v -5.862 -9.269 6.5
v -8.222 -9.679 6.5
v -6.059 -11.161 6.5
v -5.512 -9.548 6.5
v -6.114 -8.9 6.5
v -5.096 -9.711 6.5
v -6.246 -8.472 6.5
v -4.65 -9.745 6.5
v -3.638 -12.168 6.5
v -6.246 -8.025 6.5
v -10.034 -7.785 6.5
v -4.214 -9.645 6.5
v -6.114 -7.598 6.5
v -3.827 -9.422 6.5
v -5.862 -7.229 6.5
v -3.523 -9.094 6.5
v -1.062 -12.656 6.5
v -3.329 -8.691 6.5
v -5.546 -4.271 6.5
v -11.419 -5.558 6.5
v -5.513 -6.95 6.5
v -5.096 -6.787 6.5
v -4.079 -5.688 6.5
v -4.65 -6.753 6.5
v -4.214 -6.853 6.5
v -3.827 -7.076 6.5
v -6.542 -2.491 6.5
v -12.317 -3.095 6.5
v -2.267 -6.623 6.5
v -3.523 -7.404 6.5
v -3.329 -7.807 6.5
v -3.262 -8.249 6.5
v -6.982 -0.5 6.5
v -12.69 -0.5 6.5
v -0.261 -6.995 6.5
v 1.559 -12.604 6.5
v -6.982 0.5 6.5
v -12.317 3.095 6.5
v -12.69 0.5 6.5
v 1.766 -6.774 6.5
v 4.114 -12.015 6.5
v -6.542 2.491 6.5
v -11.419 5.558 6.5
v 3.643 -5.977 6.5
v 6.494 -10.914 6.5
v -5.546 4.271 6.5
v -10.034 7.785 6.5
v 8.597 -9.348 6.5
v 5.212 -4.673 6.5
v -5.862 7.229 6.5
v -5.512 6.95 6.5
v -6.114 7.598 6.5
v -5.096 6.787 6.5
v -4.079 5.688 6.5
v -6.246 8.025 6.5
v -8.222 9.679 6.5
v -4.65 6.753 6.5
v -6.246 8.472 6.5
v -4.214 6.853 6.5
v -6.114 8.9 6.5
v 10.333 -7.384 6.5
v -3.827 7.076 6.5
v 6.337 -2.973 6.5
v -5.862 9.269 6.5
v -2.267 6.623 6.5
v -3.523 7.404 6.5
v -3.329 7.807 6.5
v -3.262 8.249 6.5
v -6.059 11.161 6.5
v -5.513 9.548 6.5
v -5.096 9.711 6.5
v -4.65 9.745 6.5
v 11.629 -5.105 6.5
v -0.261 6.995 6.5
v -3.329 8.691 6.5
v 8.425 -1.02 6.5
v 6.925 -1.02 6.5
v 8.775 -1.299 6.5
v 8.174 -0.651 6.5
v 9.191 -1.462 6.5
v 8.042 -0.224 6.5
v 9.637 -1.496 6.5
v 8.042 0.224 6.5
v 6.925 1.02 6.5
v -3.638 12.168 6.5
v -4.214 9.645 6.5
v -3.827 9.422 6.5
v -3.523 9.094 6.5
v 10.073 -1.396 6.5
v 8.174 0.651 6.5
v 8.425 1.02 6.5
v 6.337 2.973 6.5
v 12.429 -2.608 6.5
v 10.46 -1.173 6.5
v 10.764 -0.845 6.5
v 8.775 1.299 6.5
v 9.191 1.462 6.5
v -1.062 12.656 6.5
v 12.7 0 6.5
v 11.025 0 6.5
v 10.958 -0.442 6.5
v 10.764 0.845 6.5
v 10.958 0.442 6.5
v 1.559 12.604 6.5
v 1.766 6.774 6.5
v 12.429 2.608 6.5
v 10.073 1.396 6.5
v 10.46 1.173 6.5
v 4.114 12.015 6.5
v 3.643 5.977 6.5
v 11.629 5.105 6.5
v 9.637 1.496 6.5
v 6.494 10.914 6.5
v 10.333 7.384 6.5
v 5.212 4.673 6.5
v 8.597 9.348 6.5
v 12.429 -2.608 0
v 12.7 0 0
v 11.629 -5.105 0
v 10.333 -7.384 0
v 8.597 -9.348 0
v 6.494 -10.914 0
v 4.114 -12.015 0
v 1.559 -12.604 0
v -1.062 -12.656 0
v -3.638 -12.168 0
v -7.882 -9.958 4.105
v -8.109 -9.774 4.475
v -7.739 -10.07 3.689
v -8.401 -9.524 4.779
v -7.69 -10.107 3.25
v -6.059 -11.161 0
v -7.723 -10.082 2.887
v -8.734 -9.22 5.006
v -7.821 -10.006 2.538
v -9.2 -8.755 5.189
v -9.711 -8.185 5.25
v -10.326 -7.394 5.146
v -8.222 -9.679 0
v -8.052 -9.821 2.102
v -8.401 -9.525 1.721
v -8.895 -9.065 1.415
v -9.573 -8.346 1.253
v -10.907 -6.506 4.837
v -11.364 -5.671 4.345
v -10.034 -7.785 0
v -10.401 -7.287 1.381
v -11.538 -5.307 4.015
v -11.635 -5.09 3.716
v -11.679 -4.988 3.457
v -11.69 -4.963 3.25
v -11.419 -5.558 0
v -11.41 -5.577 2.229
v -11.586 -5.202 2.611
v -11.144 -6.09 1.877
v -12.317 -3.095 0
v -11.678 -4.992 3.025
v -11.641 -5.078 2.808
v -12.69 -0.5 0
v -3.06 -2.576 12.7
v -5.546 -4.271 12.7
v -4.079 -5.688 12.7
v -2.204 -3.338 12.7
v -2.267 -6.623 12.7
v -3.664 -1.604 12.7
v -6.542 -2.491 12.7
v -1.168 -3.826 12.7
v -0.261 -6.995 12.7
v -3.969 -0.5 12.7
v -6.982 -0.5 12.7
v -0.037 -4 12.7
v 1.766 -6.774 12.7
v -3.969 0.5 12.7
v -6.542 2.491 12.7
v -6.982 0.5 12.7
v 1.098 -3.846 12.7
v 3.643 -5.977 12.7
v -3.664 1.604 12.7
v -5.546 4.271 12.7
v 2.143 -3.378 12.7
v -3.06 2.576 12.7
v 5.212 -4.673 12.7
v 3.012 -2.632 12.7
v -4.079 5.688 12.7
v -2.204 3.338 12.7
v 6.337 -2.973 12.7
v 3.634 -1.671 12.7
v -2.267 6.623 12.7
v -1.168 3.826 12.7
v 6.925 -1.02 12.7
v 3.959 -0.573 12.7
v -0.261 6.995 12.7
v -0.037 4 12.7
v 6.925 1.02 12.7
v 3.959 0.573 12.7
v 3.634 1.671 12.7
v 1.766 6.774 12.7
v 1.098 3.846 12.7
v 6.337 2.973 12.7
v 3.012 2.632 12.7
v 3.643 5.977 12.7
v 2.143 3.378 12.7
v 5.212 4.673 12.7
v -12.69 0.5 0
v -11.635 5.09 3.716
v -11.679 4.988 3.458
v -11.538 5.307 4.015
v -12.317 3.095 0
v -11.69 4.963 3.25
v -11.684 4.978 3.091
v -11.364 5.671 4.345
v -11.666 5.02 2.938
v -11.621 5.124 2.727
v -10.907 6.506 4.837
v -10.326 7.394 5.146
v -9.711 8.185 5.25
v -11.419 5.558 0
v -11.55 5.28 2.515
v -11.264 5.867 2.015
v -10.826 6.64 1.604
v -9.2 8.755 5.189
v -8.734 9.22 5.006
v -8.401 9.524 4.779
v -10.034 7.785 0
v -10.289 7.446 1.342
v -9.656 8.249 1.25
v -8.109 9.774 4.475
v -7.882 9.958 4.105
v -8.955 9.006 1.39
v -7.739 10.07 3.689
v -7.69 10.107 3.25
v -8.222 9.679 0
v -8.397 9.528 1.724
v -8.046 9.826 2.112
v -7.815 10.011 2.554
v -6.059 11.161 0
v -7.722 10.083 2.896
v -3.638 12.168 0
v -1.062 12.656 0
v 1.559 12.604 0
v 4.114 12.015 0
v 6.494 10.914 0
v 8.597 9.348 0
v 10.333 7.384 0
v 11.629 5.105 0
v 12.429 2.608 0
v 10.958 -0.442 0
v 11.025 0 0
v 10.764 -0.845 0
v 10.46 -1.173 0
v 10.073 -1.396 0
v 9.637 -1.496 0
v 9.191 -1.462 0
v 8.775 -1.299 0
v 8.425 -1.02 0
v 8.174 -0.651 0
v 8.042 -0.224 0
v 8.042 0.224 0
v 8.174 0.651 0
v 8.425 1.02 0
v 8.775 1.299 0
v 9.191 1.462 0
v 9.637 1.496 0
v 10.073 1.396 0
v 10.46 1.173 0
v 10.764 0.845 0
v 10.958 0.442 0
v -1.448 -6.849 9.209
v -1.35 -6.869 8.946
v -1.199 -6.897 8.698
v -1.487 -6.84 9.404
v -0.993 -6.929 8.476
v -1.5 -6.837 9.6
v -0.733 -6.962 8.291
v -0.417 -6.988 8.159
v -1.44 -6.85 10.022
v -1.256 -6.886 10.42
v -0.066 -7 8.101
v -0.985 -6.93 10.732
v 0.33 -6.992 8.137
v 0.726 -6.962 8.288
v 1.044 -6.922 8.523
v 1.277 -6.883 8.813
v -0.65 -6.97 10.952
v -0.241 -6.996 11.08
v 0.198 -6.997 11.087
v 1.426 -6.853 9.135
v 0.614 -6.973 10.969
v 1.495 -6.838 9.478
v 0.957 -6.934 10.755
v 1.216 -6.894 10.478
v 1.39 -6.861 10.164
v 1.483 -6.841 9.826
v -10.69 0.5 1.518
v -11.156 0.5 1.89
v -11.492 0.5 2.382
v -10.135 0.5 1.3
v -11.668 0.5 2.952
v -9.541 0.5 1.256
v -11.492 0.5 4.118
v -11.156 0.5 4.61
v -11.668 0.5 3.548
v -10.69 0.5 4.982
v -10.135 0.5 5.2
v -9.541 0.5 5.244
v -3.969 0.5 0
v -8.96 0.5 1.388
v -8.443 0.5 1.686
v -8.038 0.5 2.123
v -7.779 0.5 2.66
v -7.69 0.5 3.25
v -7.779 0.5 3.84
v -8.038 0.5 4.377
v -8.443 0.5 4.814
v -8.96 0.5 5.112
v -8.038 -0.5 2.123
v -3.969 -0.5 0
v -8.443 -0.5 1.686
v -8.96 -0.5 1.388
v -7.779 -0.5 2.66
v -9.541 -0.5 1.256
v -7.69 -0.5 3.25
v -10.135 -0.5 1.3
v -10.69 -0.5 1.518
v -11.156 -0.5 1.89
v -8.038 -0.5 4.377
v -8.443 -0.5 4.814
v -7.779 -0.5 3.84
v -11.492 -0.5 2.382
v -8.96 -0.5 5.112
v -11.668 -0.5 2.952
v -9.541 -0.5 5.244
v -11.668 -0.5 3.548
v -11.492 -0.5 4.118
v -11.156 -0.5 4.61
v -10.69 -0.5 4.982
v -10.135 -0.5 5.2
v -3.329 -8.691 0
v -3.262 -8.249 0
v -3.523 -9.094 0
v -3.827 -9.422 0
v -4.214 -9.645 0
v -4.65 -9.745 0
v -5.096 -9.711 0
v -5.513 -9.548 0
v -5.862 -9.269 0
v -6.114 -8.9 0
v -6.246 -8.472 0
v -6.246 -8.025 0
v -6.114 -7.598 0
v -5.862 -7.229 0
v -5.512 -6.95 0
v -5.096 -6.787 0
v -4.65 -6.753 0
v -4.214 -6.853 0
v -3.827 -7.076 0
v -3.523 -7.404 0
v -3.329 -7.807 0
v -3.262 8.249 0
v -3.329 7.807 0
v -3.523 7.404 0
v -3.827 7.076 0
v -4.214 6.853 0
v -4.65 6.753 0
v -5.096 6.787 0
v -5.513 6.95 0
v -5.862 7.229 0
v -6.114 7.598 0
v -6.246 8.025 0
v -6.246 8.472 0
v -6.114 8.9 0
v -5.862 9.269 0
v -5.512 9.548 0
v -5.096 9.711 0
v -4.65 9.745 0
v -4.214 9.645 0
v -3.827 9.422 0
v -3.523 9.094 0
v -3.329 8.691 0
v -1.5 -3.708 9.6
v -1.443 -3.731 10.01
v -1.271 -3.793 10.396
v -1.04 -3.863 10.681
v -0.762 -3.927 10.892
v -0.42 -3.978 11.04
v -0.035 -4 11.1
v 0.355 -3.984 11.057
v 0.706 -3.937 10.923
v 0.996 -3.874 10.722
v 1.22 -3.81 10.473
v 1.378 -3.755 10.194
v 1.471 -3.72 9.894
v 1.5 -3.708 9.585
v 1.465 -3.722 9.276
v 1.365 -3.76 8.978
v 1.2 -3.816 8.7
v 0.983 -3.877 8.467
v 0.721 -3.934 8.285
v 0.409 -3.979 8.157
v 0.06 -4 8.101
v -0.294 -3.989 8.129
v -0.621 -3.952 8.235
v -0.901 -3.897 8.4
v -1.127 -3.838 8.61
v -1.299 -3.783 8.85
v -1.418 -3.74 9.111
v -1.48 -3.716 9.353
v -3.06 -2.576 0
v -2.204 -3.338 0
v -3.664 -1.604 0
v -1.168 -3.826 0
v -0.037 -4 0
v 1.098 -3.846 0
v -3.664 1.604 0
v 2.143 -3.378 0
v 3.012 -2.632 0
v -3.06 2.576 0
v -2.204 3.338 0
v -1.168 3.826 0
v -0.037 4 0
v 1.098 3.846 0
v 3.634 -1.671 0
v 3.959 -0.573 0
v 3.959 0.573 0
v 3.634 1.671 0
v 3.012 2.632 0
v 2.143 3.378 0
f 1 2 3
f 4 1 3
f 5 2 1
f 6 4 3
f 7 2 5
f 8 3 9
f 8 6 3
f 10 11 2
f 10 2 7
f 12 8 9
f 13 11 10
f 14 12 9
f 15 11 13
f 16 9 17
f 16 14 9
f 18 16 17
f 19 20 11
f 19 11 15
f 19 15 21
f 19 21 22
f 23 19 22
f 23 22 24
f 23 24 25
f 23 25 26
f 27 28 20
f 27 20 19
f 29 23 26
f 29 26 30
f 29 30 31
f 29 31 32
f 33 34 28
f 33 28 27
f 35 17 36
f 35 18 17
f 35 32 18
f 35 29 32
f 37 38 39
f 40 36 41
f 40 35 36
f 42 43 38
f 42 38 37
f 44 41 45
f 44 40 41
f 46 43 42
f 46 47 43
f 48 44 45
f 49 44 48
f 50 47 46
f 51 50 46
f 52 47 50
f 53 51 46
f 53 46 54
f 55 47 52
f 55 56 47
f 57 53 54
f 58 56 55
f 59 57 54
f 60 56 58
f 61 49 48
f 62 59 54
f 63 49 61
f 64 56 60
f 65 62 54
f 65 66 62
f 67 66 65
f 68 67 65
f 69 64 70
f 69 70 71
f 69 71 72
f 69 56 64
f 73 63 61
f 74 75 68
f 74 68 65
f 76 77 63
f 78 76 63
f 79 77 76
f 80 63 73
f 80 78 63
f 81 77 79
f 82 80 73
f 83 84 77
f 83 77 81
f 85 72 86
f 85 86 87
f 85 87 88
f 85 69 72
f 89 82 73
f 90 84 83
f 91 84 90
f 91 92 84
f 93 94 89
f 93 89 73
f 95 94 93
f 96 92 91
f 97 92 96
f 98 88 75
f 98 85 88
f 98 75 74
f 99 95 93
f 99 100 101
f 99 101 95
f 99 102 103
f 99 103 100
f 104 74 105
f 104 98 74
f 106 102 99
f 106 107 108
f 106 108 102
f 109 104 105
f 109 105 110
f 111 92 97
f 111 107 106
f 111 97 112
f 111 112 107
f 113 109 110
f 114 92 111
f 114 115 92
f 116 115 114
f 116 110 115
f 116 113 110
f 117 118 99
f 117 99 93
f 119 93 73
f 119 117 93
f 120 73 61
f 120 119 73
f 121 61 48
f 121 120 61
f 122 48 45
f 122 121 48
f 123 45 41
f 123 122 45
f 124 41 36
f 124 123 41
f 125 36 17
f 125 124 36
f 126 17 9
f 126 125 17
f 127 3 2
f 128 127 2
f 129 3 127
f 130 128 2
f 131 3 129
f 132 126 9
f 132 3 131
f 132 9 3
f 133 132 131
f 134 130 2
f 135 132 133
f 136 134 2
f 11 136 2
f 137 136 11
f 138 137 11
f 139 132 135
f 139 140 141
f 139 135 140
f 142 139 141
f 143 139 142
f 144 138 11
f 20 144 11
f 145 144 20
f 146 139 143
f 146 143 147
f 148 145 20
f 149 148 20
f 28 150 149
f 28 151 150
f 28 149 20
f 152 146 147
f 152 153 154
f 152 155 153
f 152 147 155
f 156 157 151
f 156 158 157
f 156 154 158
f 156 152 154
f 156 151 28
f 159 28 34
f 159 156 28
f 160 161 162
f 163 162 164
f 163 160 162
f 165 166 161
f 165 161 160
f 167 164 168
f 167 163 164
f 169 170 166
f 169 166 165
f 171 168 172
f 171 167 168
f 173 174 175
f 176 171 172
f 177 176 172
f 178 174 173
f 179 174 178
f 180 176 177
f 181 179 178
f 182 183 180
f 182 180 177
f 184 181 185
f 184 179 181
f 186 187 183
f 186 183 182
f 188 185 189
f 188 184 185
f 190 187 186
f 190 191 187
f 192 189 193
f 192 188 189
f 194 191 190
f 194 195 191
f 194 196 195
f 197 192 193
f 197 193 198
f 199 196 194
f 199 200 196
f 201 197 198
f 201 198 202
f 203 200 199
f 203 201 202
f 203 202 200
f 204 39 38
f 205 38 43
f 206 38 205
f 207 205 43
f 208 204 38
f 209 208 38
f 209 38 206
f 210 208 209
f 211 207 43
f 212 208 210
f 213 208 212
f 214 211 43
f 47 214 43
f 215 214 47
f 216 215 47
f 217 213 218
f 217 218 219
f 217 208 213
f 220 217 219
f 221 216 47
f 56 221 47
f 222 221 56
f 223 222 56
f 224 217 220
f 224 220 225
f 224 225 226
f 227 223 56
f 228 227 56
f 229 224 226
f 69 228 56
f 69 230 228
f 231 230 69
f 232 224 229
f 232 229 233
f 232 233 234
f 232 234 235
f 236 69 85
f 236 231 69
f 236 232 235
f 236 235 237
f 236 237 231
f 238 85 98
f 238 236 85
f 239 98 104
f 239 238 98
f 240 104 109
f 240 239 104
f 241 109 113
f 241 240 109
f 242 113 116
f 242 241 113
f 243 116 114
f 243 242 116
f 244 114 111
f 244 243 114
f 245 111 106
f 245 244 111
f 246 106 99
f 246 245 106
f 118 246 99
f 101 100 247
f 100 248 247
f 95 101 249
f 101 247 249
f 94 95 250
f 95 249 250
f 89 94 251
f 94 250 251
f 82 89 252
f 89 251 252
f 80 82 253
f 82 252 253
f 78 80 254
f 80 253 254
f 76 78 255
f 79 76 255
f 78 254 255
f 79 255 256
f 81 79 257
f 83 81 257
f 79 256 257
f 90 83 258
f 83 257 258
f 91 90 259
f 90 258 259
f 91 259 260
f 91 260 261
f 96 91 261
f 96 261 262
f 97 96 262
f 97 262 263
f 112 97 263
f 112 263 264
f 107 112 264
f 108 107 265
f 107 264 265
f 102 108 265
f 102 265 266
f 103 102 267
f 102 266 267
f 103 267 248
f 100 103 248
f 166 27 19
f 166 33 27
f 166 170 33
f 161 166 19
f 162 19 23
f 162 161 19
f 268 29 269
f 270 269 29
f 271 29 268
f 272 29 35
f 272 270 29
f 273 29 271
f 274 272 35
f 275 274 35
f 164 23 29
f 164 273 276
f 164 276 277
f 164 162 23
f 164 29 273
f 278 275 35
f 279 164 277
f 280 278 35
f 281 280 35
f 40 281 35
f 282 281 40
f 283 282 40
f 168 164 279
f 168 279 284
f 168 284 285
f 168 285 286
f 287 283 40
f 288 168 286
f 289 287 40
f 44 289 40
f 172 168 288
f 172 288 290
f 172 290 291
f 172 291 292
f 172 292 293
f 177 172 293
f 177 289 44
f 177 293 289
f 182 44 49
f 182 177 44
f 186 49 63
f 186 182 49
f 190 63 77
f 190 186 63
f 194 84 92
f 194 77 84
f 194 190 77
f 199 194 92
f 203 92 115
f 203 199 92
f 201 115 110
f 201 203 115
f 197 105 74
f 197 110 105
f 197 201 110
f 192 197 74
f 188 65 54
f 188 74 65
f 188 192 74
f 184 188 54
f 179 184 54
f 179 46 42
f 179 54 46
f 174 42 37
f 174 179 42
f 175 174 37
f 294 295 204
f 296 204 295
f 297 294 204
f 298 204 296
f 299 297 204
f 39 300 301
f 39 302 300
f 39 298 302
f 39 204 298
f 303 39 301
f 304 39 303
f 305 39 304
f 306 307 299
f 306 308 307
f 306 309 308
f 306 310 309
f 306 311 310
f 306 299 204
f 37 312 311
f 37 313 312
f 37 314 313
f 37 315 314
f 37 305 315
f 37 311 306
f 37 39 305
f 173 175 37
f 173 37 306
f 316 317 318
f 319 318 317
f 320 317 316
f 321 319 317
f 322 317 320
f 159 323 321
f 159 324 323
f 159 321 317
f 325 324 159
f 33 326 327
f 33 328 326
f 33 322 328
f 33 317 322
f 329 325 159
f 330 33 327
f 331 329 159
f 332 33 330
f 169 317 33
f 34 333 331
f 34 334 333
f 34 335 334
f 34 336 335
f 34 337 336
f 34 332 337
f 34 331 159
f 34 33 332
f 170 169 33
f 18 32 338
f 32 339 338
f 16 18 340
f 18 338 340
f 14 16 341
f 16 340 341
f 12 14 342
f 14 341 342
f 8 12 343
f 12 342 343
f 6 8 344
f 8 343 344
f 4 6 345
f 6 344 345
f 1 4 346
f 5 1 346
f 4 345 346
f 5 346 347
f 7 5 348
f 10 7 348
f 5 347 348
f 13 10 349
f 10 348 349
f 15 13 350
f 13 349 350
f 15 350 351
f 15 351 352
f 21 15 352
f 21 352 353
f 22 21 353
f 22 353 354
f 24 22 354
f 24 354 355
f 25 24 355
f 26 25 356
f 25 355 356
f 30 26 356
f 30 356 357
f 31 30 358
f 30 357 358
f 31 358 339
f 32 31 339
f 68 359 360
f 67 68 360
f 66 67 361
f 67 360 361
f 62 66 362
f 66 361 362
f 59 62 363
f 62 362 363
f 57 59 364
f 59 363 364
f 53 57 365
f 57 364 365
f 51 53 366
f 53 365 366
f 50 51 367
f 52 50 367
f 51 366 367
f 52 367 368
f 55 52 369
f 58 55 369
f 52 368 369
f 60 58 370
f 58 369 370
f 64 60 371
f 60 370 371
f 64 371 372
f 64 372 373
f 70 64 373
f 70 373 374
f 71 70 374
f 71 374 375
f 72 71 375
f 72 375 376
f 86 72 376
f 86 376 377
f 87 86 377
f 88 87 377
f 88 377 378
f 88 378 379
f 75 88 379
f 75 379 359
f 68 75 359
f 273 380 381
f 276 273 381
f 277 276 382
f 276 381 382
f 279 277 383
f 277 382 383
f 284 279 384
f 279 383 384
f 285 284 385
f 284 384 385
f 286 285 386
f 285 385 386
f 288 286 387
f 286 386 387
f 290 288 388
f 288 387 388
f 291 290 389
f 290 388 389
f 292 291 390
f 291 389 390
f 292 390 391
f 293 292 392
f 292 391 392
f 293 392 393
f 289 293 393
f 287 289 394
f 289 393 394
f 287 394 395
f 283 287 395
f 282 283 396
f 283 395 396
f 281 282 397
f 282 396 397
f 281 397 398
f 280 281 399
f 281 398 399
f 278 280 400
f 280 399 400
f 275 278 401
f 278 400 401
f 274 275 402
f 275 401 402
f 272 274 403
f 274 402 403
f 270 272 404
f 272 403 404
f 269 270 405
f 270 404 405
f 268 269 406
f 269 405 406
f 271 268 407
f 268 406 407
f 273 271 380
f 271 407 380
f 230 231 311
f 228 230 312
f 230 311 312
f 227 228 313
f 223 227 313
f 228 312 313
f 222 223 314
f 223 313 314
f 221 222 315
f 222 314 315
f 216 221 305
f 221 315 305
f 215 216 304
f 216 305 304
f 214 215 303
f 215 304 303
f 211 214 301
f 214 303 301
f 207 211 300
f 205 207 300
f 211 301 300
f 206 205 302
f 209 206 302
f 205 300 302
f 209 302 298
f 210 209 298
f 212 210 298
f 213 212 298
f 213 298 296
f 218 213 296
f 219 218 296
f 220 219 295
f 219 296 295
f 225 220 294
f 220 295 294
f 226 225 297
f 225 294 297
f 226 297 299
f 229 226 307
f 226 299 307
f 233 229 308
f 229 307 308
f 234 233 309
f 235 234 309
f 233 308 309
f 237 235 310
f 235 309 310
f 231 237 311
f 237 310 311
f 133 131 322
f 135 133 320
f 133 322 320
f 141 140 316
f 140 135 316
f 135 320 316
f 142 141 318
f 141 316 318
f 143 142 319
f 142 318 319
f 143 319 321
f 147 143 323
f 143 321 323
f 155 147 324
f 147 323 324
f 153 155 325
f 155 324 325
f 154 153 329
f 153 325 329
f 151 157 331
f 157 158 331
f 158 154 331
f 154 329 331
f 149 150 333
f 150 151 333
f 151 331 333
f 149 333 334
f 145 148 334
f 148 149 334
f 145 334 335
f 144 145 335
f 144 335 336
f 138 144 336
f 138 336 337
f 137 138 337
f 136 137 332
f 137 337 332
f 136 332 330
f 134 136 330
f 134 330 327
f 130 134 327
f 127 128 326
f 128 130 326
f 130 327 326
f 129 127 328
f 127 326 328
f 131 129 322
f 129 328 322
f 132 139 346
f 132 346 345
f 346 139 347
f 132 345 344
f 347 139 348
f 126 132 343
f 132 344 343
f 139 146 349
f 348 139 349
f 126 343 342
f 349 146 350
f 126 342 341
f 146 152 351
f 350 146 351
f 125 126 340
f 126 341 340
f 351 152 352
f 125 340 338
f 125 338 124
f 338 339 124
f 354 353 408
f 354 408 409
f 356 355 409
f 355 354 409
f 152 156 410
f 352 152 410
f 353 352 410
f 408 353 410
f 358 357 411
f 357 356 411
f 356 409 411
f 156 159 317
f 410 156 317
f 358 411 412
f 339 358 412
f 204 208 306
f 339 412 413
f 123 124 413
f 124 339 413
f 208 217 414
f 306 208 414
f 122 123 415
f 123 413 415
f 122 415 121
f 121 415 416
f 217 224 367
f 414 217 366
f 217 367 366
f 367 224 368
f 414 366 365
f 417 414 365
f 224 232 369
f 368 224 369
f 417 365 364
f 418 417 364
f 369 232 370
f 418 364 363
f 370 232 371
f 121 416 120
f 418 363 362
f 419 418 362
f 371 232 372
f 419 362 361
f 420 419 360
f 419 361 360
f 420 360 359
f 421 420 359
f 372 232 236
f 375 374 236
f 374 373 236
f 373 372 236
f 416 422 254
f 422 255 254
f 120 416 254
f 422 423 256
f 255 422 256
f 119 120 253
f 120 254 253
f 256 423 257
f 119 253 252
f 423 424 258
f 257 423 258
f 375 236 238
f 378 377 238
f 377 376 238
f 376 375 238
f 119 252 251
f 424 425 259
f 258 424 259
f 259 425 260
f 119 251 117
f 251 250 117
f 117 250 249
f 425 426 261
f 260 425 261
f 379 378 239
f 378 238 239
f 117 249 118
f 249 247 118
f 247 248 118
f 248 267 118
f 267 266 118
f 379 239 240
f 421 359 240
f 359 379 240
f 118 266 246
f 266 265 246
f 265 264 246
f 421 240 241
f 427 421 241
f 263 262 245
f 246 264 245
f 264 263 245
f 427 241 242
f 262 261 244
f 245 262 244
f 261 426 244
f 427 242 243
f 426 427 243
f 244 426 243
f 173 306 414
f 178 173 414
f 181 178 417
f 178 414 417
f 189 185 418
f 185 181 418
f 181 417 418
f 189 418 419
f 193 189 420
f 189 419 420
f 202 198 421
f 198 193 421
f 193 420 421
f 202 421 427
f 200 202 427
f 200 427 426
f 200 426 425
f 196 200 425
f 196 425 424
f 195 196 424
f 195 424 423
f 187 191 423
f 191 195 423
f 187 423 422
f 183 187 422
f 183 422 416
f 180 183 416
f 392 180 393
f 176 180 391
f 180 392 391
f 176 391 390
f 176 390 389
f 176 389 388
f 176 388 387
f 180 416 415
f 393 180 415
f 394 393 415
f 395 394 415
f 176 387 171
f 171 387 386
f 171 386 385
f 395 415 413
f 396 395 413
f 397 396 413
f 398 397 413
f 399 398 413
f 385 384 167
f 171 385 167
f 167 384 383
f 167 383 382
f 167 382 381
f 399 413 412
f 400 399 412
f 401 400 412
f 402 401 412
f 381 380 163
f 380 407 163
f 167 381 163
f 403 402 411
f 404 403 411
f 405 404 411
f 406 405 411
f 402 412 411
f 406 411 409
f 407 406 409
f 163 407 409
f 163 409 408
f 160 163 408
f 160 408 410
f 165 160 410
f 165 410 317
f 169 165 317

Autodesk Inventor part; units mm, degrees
ref_plane "YZ Plane" through (0, 0, 0) normal (1, 0, 0) x (0, 1, 0)
ref_plane "XZ Plane" through (0, 0, 0) normal (0, 1, 0) x (-1, 0, 0)
ref_plane "XY Plane" through (0, 0, 0) normal (0, 0, 1) x (1, 0, 0)
sketch "Sketch1" plane through (0, 0, 0) normal (0, 0, 1) x (1, 0, 0)
  circle A0 centre (0, 0) radius 12.7
  circle A1 centre (0, 0) radius 4
  circle A2 centre (9.525, 0) radius 1.5
  circle A3 centre (-4.7625, 8.2489) radius 1.5
  circle A4 centre (-4.7625, -8.2489) radius 1.5
  dimension "d0" = 25.4
  dimension "d1" = 8
  dimension "d2" = 3
  dimension "d6" = 360
  dimension "d25" = 9.525
extrude "Extrusion1" add sketch "Sketch1" along normal blind 12.7
sketch "Sketch2" plane through (0, 0, 12.7) normal (0, 0, 1) x (1, 0, 0)
  line L0 (-12.7, 0.5) -> (-3.9686, 0.5)
  line L1 (-3.9686, 0.5) -> (-3.9686, -0.5)
  line L2 (-3.9686, -0.5) -> (-12.7, -0.5)
  line L3 (-12.7, -0.5) -> (-12.7, 0.5)
  circle A0 centre (0, 0) radius 12.7 construction
  circle A1 centre (0, 0) radius 4 construction
  point P0 (-3.9686, 0)
  point P1 (-12.7, 0)
  dimension "d10" = 1
extrude "Extrusion2" cut sketch "Sketch2" against normal through all
sketch "Sketch3" plane through (-12.6902, 0.5, 12.7) normal (0, -1, 0) x (1, 0, 0)
  circle A0 centre (3, -3) radius 2
  circle A1 centre (3, -9.45) radius 2
  line L0 (25.3902, 0) -> (0, 0) projected
  line L1 (0, -12.7) -> (25.3902, -12.7) projected
  point P0 (12.6902, -12.7)
  point P1 (12.6902, -12.7)
  point P2 (12.6902, -12.7)
  point P3 (12.6902, -12.7)
  point P4 (12.6902, -12.7)
  dimension "d13" = 4
  dimension "d14" = 4
  dimension "d15" = 3
  dimension "d16" = 3
  dimension "d17" = 3.25
extrude "Extrusion3" cut sketch "Sketch3" along normal through all both and the other way through all
sketch "Sketch4" plane through (0, 0, 12.7) normal (0, 0, 1) x (1, 0, 0)
  circle A0 centre (0, 0) radius 7
  arc A1 (-12.6902, -0.5) -> (-12.6902, 0.5) centre (0, 0) ccw projected
  circle A2 centre (0, 0) radius 12.7
  dimension "d24" = 14
extrude "Extrusion4" cut sketch "Sketch4" against normal blind 6.2
sketch "Sketch5" plane through (0, 0, 0) normal (0, 1, 0) x (-1, 0, 0)
  circle A0 centre (0, 9.6) radius 1.5
  circle A1 centre (0, 3.25) radius 1.5
  line L0 (-12.7, 0) -> (-12.7, 6.5) projected
  line L1 (-7, 12.7) -> (-7, 6.5) projected
  point P0 (0, 0)
  point P1 (-12.7, 3.25)
  point P2 (-7, 9.6)
  dimension "d28" = 3
  dimension "d29" = 3
extrude "Extrusion5" cut sketch "Sketch5" against normal through all contours A0
thread "Thread2" size "M4x0.7" class "6H" standard "ANSI Metric M Profile" full length
thread "Thread3" size "M3x0.5" class "6H" standard "ANSI Metric M Profile" full length
properties part number "AA056" material "Aluminum 6061"
